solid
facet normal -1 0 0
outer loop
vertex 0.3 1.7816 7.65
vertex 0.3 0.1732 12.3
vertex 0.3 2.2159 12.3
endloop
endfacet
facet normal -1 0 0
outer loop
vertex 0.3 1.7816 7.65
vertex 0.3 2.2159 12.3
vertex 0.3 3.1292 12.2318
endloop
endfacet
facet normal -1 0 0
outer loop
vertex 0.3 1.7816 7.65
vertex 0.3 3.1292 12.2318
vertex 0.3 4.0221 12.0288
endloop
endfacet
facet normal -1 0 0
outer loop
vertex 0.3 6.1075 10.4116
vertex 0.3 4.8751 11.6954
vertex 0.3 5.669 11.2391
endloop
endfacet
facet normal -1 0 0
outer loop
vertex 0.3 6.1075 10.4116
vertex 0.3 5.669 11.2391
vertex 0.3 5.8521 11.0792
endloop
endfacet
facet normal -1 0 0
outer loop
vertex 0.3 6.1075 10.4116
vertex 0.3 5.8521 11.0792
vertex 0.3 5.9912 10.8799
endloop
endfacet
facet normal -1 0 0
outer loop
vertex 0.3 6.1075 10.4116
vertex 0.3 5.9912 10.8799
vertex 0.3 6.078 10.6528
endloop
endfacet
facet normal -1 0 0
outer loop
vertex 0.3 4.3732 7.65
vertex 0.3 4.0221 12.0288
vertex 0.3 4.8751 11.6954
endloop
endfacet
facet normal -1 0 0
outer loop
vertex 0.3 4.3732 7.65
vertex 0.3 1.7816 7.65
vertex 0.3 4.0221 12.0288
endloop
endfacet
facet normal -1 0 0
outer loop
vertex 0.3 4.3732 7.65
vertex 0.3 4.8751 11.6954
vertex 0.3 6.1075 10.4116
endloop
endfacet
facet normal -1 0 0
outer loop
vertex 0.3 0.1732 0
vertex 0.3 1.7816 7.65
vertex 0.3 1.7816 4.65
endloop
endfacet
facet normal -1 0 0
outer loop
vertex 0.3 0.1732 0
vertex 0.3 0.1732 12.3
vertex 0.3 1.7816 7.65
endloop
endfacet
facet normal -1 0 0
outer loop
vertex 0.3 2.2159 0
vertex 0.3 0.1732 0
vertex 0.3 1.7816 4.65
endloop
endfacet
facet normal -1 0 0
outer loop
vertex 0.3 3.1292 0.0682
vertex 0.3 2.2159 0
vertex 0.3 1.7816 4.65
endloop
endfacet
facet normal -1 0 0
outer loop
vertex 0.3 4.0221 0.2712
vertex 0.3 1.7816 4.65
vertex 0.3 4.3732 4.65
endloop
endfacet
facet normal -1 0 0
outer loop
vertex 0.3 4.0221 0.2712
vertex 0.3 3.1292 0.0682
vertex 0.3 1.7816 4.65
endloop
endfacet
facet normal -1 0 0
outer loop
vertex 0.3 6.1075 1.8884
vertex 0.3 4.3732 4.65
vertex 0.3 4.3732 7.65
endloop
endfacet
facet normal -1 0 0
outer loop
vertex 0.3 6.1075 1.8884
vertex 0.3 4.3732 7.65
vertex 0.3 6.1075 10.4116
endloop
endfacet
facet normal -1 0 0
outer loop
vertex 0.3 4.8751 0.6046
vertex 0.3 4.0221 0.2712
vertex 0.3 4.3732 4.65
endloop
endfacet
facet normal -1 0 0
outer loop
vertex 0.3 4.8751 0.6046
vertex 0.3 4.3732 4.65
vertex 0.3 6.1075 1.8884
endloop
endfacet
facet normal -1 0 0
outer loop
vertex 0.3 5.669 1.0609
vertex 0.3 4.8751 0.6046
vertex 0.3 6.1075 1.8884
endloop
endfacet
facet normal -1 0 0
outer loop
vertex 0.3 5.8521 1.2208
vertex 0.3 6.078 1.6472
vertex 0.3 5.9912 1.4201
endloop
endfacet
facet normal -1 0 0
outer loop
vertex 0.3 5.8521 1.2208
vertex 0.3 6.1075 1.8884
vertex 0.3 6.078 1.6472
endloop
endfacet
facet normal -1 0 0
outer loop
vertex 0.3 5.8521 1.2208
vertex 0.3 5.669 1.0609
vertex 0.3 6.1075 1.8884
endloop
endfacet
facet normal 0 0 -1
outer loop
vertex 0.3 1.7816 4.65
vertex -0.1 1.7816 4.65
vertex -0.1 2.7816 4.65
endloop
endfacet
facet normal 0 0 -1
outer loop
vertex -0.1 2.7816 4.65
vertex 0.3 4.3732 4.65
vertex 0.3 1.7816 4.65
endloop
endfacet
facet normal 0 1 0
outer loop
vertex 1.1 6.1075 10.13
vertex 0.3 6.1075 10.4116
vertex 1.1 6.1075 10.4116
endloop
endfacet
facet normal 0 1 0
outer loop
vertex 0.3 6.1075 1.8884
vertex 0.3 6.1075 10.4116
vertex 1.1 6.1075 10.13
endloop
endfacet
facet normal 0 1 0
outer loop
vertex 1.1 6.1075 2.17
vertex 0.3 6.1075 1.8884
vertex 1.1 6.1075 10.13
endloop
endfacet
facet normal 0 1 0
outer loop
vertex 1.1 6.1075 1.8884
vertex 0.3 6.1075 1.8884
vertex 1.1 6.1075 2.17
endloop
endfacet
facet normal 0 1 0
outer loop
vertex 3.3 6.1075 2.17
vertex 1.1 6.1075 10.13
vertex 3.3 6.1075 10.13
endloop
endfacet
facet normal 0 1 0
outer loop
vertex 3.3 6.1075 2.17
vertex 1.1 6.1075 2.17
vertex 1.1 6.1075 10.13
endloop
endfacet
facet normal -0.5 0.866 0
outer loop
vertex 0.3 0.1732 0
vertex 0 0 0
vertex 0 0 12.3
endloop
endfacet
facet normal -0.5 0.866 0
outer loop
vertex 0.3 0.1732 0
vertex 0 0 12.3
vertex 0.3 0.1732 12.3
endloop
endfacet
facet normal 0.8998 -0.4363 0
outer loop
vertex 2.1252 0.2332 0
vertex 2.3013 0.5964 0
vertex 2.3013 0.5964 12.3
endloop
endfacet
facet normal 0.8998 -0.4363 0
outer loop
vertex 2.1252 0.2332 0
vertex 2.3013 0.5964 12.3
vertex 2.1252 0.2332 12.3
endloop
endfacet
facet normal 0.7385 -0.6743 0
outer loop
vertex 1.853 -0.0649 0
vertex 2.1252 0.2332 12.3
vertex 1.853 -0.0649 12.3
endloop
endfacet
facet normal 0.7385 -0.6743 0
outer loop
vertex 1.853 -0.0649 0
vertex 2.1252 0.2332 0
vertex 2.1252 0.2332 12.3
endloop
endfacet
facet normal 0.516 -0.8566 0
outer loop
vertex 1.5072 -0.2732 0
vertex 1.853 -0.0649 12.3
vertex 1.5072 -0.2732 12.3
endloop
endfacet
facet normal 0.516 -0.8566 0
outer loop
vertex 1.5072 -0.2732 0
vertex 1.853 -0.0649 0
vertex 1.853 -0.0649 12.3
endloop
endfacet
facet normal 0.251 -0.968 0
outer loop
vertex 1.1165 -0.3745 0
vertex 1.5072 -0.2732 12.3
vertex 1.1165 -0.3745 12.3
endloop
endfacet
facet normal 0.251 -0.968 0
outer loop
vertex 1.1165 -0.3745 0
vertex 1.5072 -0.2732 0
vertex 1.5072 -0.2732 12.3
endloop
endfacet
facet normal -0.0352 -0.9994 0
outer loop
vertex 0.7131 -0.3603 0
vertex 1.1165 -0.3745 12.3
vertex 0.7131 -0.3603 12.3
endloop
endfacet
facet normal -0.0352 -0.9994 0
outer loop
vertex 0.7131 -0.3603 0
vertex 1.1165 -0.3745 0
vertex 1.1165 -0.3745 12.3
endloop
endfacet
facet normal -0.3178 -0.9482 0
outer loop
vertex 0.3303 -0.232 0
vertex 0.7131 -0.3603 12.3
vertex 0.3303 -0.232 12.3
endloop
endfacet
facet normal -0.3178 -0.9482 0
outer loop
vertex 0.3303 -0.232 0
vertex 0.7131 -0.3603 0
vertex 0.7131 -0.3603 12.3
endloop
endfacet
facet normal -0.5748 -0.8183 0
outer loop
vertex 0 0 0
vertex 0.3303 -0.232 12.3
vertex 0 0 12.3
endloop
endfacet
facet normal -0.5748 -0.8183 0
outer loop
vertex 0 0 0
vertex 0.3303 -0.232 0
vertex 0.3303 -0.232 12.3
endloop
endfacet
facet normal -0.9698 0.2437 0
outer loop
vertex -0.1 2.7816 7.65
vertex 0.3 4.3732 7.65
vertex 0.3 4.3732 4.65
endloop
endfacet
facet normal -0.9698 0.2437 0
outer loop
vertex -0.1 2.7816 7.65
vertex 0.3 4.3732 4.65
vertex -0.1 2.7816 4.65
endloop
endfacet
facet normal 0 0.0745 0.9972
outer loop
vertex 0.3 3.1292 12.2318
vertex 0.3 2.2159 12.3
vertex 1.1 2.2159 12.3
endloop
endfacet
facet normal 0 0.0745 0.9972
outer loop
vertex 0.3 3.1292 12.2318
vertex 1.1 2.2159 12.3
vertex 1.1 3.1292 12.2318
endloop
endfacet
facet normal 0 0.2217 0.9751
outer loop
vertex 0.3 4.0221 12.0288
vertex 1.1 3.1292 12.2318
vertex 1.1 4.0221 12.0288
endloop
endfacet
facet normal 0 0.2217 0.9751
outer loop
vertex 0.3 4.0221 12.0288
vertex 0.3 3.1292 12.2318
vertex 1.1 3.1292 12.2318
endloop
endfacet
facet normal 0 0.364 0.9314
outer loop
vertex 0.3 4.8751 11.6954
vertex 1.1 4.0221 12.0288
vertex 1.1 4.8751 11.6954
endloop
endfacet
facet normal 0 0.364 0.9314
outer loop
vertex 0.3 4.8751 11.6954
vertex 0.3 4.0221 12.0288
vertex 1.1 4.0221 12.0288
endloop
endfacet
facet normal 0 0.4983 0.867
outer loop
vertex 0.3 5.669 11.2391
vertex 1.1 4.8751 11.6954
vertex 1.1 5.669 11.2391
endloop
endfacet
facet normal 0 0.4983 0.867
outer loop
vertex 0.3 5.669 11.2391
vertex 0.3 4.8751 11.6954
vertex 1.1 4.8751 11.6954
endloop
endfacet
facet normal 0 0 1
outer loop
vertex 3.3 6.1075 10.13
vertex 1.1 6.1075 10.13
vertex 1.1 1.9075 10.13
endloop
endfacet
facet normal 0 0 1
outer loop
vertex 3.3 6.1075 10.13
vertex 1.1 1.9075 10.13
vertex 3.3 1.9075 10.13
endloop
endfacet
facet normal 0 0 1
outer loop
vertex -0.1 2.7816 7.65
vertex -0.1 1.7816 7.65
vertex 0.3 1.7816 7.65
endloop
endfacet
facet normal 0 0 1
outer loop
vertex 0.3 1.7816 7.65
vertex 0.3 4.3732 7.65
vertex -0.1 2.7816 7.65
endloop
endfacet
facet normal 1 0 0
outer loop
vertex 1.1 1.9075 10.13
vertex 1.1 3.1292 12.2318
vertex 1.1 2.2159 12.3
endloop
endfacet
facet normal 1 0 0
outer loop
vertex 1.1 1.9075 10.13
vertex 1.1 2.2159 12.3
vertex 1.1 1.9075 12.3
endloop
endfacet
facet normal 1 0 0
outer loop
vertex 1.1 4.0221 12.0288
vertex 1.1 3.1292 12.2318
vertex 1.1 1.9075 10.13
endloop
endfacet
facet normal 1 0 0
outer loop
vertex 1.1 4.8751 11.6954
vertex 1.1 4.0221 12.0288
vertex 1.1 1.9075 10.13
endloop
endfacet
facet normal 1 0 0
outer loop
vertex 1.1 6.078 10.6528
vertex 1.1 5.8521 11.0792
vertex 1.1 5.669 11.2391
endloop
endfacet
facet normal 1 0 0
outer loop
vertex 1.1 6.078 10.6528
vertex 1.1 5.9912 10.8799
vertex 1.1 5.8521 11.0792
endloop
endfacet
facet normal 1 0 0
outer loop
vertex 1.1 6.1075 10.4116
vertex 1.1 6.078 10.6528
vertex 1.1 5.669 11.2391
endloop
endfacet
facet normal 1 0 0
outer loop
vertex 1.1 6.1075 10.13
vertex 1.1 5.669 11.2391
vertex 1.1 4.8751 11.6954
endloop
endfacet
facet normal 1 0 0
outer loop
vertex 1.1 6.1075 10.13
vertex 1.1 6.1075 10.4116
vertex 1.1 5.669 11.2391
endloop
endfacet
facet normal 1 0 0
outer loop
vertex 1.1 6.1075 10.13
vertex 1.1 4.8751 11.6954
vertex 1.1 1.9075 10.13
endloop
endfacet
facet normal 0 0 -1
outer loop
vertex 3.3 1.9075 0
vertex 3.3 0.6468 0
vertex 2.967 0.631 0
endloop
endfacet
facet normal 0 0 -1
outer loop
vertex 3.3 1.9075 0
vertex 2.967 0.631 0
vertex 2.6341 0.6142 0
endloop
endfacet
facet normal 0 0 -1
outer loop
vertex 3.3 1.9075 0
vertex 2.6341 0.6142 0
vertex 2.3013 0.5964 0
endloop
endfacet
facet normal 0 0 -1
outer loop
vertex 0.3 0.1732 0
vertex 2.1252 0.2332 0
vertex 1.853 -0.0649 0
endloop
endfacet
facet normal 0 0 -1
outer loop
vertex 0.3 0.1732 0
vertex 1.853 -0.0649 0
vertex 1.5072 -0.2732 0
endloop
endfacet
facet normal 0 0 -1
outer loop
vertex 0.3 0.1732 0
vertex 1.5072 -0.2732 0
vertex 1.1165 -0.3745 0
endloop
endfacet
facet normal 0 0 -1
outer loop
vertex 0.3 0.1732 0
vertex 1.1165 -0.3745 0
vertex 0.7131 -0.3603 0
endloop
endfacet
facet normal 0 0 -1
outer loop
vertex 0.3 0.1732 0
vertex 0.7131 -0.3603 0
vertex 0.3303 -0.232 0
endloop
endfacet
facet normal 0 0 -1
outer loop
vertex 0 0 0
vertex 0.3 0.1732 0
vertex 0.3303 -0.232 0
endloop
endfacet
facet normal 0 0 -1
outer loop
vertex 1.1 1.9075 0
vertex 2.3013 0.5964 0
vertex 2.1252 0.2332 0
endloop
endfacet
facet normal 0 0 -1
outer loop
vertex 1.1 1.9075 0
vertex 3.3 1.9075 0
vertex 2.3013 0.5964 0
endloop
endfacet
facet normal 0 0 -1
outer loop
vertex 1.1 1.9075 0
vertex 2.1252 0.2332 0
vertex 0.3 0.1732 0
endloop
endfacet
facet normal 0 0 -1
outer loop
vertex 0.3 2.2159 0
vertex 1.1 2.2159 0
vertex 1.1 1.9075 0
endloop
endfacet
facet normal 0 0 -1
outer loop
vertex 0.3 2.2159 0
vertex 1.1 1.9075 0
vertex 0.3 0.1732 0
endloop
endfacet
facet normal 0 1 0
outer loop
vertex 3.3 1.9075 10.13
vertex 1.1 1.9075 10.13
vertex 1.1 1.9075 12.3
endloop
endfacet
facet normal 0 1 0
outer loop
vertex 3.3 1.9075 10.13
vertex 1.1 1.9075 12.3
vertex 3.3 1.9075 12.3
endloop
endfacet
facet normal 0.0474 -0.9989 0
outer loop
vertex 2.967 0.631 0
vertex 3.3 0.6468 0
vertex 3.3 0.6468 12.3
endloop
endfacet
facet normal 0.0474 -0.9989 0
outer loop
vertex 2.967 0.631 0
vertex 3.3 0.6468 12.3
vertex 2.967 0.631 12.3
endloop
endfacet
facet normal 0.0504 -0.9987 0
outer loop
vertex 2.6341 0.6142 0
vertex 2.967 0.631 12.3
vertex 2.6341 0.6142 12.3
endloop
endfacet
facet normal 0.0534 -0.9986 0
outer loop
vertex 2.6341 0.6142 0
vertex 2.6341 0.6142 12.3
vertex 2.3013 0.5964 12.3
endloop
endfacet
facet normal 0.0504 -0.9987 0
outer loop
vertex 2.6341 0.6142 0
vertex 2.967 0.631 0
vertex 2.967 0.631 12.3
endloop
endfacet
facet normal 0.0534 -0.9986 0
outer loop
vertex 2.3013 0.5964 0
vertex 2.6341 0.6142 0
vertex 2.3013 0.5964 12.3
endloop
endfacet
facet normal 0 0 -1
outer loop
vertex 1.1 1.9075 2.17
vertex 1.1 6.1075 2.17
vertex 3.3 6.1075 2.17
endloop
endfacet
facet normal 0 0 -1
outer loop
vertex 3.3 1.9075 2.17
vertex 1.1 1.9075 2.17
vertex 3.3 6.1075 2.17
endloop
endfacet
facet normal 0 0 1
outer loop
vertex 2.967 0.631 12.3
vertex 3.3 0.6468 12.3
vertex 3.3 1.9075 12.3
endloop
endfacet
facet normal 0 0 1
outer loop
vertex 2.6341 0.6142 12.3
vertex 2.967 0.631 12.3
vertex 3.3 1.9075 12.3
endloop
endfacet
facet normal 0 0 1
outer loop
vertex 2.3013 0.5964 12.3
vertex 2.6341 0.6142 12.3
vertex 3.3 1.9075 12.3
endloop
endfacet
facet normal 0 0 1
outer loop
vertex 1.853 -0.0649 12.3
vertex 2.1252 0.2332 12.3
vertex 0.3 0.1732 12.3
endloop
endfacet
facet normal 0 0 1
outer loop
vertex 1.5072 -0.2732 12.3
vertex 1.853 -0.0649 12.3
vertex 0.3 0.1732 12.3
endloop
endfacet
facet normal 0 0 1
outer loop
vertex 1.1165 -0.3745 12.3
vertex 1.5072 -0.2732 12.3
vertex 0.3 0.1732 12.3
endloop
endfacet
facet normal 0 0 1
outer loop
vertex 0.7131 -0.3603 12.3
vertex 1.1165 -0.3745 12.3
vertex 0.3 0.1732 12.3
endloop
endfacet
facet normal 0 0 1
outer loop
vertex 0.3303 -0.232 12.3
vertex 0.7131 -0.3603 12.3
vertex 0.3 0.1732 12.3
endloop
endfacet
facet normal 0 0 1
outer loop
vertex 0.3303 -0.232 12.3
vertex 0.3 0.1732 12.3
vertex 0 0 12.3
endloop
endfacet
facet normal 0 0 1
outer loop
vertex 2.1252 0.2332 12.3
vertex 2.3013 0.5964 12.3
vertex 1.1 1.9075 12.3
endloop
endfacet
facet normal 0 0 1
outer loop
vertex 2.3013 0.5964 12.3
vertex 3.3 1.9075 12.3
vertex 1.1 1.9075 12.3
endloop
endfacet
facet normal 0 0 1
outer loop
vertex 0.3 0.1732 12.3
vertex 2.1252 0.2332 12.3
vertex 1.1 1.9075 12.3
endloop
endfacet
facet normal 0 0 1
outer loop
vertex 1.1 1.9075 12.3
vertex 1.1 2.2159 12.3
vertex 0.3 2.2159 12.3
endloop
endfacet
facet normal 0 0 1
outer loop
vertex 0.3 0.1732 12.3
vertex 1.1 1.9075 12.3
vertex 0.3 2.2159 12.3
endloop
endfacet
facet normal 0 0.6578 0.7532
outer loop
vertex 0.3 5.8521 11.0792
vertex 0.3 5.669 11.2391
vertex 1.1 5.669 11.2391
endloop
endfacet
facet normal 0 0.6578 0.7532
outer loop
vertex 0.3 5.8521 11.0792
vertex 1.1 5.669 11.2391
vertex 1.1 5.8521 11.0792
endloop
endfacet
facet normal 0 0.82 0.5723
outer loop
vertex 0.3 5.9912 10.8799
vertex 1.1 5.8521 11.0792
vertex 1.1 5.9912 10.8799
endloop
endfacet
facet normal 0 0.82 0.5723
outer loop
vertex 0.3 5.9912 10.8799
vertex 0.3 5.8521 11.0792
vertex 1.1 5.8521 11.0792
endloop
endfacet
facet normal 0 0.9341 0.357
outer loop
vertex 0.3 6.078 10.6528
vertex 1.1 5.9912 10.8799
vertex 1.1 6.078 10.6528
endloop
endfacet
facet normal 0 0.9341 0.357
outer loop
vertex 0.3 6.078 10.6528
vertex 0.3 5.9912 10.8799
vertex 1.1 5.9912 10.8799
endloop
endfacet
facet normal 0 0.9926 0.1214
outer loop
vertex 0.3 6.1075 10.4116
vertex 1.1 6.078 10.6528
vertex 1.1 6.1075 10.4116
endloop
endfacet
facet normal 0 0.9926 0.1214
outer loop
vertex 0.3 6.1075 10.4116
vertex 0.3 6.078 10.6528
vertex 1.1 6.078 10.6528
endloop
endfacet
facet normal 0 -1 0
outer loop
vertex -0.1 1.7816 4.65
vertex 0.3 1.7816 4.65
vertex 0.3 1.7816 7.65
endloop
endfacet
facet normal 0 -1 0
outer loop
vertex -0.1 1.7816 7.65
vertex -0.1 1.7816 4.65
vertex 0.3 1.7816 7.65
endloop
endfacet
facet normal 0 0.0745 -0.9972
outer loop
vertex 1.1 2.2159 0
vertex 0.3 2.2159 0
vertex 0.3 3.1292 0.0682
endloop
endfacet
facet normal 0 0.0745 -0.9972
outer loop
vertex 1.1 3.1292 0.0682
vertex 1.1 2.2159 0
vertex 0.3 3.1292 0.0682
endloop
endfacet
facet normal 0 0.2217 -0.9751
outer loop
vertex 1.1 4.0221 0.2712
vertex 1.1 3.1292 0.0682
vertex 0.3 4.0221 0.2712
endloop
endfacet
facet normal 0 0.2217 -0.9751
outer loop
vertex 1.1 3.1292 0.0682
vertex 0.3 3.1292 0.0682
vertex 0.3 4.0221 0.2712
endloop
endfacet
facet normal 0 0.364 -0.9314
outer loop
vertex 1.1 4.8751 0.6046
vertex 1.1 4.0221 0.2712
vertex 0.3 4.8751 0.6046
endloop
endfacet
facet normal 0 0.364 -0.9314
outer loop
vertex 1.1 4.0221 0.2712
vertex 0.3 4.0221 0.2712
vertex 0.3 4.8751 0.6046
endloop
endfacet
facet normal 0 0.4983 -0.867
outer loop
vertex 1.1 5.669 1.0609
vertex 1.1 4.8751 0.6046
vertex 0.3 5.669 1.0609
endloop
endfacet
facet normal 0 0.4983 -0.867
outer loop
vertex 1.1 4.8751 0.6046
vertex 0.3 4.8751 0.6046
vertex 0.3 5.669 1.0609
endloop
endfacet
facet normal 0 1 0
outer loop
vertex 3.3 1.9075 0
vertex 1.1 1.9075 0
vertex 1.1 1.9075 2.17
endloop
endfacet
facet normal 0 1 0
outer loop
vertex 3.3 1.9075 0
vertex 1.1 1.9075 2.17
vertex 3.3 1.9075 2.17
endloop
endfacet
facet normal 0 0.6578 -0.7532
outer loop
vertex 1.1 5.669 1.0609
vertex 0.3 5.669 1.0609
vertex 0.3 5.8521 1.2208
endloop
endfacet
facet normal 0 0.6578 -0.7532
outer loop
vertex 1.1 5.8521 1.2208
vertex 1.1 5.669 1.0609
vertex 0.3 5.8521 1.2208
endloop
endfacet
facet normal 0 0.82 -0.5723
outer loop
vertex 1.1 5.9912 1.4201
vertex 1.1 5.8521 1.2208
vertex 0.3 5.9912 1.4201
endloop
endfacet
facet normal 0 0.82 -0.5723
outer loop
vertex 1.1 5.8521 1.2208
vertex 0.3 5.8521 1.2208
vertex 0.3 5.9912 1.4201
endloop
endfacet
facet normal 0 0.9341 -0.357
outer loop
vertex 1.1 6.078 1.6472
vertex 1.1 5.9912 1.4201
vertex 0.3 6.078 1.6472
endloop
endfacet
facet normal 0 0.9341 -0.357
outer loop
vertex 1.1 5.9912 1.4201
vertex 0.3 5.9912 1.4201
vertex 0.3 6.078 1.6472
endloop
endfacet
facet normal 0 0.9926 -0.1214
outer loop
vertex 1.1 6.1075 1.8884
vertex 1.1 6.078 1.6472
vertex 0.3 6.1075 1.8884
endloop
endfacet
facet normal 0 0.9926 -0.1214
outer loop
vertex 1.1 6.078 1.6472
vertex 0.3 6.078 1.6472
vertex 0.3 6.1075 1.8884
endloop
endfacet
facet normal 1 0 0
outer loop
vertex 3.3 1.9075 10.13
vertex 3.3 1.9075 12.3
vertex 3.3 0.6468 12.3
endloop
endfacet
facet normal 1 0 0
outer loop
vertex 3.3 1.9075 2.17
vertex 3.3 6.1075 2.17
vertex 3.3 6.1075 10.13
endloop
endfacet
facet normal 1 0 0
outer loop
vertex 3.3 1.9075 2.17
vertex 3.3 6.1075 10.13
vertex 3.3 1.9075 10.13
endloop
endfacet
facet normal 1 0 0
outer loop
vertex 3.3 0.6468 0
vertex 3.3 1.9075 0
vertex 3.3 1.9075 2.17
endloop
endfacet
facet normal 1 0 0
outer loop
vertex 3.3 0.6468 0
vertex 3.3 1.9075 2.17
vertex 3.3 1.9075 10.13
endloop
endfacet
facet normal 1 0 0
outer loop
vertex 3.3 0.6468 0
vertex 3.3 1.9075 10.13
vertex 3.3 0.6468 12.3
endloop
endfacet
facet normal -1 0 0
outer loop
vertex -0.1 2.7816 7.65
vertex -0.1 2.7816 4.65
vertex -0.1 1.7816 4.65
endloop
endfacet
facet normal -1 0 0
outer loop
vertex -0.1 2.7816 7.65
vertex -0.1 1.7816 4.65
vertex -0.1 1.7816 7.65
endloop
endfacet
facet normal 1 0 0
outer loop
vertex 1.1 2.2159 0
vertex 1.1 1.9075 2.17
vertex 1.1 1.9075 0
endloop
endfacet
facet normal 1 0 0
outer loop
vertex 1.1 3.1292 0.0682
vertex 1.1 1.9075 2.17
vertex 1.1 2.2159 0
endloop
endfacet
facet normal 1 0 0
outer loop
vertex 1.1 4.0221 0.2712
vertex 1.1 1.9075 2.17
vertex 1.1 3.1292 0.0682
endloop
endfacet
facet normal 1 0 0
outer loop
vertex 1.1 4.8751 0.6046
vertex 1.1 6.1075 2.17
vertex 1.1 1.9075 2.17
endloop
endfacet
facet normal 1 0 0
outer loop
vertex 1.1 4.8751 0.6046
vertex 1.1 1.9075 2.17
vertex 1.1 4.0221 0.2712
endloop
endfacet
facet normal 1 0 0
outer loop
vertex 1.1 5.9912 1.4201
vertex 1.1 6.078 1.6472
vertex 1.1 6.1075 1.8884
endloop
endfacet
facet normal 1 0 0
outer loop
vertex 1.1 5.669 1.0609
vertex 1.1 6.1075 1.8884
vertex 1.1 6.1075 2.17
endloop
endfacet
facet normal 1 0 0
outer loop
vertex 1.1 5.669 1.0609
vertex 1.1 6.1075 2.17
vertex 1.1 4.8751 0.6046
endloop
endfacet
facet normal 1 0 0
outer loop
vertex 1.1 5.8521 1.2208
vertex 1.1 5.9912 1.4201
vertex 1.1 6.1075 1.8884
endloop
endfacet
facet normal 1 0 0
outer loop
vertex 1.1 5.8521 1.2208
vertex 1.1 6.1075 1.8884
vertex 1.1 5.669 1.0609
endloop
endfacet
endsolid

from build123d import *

# Parameters (mm, degrees)
BOSS_EXTRUDE1_DEPTH = 12.3
SKETCH2_W           = 2.2
SKETCH2_H           = 2.17
CUT_EXTRUDE1_DEPTH  = 4.2
CUT_EXTRUDE3_DEPTH  = 0.8
SKETCH5_W           = 3
SKETCH5_H           = 1
BOSS_EXTRUDE2_DEPTH = 0.4
BOSS_EXTRUDE3_DEPTH = 3


with BuildPart() as part:
    # Sketch1 → Boss-Extrude1 (new body)
    with BuildSketch(Plane.XY):
        with BuildLine():
            Line((0, 0), (0.299997713, 0.173208719))
            Line((0.299997713, 0.173208719), (0.299997713, 1.781598719))
            Line((0.299997713, 1.781598719), (0.299997713, 6.107458719))
            Line((0.299997713, 6.107458719), (3.299997713, 6.107458719))
            Line((3.299997713, 6.107458719), (3.299997713, 0.646828719))
            ThreePointArc((3.299997713, 0.646828719), (2.80057856, 0.622710158), (2.301269667, 0.596407591))
            ThreePointArc((2.301269667, 0.596407591), (1.315500673, -0.337939607), (0, 0))
        make_face()
    extrude(amount=BOSS_EXTRUDE1_DEPTH)

    # Sketch2 → Cut-Extrude1 (cut)
    with BuildSketch(Plane(origin=(0, 6.107458719, 0), x_dir=(1, 0, 0), z_dir=(0, 1, 0))):
        with Locations((2.199997713, -1.085)):
            Rectangle(SKETCH2_W, SKETCH2_H)
        with Locations((2.199997713, -11.215)):
            Rectangle(SKETCH2_W, SKETCH2_H)
    extrude(amount=-CUT_EXTRUDE1_DEPTH, mode=Mode.SUBTRACT)

    # Sketch4 → Cut-Extrude3 (cut)
    with BuildSketch(Plane.ZY.offset(-0.299997713)):
        with BuildLine():
            Line((10.41158, 6.107458719), (12.3, 6.107458719))
            Line((12.3, 6.107458719), (12.3, 2.215929667))
            ThreePointArc((12.3, 2.215929667), (12.02880398, 4.022129667), (11.23913234, 5.669043272))
            ThreePointArc((11.23913234, 5.669043272), (10.879869522, 5.991150317), (10.41158, 6.107458719))
        make_face()
        with BuildLine():
            Line((1.88842, 6.107458719), (0, 6.107458719))
            Line((0, 6.107458719), (0, 2.215929667))
            ThreePointArc((0, 2.215929667), (0.27119602, 4.022129667), (1.06086766, 5.669043272))
            ThreePointArc((1.06086766, 5.669043272), (1.420130478, 5.991150317), (1.88842, 6.107458719))
        make_face()
    extrude(amount=-CUT_EXTRUDE3_DEPTH, mode=Mode.SUBTRACT)

    # Sketch5 → Boss-Extrude2 (add)
    with BuildSketch(Plane.ZY.offset(-0.299997713)):
        with Locations((6.15, 2.281598719)):
            Rectangle(SKETCH5_W, SKETCH5_H)
    extrude(amount=BOSS_EXTRUDE2_DEPTH)

    # Sketch6 → Boss-Extrude3 (add)
    with BuildSketch(Plane.XY.offset(7.65)):
        Polygon((0.299997713, 2.781598719), (0.299997713, 4.373208719), (-0.100002287, 2.781598719), align=None)
    extrude(amount=-BOSS_EXTRUDE3_DEPTH)


solid = part.part
